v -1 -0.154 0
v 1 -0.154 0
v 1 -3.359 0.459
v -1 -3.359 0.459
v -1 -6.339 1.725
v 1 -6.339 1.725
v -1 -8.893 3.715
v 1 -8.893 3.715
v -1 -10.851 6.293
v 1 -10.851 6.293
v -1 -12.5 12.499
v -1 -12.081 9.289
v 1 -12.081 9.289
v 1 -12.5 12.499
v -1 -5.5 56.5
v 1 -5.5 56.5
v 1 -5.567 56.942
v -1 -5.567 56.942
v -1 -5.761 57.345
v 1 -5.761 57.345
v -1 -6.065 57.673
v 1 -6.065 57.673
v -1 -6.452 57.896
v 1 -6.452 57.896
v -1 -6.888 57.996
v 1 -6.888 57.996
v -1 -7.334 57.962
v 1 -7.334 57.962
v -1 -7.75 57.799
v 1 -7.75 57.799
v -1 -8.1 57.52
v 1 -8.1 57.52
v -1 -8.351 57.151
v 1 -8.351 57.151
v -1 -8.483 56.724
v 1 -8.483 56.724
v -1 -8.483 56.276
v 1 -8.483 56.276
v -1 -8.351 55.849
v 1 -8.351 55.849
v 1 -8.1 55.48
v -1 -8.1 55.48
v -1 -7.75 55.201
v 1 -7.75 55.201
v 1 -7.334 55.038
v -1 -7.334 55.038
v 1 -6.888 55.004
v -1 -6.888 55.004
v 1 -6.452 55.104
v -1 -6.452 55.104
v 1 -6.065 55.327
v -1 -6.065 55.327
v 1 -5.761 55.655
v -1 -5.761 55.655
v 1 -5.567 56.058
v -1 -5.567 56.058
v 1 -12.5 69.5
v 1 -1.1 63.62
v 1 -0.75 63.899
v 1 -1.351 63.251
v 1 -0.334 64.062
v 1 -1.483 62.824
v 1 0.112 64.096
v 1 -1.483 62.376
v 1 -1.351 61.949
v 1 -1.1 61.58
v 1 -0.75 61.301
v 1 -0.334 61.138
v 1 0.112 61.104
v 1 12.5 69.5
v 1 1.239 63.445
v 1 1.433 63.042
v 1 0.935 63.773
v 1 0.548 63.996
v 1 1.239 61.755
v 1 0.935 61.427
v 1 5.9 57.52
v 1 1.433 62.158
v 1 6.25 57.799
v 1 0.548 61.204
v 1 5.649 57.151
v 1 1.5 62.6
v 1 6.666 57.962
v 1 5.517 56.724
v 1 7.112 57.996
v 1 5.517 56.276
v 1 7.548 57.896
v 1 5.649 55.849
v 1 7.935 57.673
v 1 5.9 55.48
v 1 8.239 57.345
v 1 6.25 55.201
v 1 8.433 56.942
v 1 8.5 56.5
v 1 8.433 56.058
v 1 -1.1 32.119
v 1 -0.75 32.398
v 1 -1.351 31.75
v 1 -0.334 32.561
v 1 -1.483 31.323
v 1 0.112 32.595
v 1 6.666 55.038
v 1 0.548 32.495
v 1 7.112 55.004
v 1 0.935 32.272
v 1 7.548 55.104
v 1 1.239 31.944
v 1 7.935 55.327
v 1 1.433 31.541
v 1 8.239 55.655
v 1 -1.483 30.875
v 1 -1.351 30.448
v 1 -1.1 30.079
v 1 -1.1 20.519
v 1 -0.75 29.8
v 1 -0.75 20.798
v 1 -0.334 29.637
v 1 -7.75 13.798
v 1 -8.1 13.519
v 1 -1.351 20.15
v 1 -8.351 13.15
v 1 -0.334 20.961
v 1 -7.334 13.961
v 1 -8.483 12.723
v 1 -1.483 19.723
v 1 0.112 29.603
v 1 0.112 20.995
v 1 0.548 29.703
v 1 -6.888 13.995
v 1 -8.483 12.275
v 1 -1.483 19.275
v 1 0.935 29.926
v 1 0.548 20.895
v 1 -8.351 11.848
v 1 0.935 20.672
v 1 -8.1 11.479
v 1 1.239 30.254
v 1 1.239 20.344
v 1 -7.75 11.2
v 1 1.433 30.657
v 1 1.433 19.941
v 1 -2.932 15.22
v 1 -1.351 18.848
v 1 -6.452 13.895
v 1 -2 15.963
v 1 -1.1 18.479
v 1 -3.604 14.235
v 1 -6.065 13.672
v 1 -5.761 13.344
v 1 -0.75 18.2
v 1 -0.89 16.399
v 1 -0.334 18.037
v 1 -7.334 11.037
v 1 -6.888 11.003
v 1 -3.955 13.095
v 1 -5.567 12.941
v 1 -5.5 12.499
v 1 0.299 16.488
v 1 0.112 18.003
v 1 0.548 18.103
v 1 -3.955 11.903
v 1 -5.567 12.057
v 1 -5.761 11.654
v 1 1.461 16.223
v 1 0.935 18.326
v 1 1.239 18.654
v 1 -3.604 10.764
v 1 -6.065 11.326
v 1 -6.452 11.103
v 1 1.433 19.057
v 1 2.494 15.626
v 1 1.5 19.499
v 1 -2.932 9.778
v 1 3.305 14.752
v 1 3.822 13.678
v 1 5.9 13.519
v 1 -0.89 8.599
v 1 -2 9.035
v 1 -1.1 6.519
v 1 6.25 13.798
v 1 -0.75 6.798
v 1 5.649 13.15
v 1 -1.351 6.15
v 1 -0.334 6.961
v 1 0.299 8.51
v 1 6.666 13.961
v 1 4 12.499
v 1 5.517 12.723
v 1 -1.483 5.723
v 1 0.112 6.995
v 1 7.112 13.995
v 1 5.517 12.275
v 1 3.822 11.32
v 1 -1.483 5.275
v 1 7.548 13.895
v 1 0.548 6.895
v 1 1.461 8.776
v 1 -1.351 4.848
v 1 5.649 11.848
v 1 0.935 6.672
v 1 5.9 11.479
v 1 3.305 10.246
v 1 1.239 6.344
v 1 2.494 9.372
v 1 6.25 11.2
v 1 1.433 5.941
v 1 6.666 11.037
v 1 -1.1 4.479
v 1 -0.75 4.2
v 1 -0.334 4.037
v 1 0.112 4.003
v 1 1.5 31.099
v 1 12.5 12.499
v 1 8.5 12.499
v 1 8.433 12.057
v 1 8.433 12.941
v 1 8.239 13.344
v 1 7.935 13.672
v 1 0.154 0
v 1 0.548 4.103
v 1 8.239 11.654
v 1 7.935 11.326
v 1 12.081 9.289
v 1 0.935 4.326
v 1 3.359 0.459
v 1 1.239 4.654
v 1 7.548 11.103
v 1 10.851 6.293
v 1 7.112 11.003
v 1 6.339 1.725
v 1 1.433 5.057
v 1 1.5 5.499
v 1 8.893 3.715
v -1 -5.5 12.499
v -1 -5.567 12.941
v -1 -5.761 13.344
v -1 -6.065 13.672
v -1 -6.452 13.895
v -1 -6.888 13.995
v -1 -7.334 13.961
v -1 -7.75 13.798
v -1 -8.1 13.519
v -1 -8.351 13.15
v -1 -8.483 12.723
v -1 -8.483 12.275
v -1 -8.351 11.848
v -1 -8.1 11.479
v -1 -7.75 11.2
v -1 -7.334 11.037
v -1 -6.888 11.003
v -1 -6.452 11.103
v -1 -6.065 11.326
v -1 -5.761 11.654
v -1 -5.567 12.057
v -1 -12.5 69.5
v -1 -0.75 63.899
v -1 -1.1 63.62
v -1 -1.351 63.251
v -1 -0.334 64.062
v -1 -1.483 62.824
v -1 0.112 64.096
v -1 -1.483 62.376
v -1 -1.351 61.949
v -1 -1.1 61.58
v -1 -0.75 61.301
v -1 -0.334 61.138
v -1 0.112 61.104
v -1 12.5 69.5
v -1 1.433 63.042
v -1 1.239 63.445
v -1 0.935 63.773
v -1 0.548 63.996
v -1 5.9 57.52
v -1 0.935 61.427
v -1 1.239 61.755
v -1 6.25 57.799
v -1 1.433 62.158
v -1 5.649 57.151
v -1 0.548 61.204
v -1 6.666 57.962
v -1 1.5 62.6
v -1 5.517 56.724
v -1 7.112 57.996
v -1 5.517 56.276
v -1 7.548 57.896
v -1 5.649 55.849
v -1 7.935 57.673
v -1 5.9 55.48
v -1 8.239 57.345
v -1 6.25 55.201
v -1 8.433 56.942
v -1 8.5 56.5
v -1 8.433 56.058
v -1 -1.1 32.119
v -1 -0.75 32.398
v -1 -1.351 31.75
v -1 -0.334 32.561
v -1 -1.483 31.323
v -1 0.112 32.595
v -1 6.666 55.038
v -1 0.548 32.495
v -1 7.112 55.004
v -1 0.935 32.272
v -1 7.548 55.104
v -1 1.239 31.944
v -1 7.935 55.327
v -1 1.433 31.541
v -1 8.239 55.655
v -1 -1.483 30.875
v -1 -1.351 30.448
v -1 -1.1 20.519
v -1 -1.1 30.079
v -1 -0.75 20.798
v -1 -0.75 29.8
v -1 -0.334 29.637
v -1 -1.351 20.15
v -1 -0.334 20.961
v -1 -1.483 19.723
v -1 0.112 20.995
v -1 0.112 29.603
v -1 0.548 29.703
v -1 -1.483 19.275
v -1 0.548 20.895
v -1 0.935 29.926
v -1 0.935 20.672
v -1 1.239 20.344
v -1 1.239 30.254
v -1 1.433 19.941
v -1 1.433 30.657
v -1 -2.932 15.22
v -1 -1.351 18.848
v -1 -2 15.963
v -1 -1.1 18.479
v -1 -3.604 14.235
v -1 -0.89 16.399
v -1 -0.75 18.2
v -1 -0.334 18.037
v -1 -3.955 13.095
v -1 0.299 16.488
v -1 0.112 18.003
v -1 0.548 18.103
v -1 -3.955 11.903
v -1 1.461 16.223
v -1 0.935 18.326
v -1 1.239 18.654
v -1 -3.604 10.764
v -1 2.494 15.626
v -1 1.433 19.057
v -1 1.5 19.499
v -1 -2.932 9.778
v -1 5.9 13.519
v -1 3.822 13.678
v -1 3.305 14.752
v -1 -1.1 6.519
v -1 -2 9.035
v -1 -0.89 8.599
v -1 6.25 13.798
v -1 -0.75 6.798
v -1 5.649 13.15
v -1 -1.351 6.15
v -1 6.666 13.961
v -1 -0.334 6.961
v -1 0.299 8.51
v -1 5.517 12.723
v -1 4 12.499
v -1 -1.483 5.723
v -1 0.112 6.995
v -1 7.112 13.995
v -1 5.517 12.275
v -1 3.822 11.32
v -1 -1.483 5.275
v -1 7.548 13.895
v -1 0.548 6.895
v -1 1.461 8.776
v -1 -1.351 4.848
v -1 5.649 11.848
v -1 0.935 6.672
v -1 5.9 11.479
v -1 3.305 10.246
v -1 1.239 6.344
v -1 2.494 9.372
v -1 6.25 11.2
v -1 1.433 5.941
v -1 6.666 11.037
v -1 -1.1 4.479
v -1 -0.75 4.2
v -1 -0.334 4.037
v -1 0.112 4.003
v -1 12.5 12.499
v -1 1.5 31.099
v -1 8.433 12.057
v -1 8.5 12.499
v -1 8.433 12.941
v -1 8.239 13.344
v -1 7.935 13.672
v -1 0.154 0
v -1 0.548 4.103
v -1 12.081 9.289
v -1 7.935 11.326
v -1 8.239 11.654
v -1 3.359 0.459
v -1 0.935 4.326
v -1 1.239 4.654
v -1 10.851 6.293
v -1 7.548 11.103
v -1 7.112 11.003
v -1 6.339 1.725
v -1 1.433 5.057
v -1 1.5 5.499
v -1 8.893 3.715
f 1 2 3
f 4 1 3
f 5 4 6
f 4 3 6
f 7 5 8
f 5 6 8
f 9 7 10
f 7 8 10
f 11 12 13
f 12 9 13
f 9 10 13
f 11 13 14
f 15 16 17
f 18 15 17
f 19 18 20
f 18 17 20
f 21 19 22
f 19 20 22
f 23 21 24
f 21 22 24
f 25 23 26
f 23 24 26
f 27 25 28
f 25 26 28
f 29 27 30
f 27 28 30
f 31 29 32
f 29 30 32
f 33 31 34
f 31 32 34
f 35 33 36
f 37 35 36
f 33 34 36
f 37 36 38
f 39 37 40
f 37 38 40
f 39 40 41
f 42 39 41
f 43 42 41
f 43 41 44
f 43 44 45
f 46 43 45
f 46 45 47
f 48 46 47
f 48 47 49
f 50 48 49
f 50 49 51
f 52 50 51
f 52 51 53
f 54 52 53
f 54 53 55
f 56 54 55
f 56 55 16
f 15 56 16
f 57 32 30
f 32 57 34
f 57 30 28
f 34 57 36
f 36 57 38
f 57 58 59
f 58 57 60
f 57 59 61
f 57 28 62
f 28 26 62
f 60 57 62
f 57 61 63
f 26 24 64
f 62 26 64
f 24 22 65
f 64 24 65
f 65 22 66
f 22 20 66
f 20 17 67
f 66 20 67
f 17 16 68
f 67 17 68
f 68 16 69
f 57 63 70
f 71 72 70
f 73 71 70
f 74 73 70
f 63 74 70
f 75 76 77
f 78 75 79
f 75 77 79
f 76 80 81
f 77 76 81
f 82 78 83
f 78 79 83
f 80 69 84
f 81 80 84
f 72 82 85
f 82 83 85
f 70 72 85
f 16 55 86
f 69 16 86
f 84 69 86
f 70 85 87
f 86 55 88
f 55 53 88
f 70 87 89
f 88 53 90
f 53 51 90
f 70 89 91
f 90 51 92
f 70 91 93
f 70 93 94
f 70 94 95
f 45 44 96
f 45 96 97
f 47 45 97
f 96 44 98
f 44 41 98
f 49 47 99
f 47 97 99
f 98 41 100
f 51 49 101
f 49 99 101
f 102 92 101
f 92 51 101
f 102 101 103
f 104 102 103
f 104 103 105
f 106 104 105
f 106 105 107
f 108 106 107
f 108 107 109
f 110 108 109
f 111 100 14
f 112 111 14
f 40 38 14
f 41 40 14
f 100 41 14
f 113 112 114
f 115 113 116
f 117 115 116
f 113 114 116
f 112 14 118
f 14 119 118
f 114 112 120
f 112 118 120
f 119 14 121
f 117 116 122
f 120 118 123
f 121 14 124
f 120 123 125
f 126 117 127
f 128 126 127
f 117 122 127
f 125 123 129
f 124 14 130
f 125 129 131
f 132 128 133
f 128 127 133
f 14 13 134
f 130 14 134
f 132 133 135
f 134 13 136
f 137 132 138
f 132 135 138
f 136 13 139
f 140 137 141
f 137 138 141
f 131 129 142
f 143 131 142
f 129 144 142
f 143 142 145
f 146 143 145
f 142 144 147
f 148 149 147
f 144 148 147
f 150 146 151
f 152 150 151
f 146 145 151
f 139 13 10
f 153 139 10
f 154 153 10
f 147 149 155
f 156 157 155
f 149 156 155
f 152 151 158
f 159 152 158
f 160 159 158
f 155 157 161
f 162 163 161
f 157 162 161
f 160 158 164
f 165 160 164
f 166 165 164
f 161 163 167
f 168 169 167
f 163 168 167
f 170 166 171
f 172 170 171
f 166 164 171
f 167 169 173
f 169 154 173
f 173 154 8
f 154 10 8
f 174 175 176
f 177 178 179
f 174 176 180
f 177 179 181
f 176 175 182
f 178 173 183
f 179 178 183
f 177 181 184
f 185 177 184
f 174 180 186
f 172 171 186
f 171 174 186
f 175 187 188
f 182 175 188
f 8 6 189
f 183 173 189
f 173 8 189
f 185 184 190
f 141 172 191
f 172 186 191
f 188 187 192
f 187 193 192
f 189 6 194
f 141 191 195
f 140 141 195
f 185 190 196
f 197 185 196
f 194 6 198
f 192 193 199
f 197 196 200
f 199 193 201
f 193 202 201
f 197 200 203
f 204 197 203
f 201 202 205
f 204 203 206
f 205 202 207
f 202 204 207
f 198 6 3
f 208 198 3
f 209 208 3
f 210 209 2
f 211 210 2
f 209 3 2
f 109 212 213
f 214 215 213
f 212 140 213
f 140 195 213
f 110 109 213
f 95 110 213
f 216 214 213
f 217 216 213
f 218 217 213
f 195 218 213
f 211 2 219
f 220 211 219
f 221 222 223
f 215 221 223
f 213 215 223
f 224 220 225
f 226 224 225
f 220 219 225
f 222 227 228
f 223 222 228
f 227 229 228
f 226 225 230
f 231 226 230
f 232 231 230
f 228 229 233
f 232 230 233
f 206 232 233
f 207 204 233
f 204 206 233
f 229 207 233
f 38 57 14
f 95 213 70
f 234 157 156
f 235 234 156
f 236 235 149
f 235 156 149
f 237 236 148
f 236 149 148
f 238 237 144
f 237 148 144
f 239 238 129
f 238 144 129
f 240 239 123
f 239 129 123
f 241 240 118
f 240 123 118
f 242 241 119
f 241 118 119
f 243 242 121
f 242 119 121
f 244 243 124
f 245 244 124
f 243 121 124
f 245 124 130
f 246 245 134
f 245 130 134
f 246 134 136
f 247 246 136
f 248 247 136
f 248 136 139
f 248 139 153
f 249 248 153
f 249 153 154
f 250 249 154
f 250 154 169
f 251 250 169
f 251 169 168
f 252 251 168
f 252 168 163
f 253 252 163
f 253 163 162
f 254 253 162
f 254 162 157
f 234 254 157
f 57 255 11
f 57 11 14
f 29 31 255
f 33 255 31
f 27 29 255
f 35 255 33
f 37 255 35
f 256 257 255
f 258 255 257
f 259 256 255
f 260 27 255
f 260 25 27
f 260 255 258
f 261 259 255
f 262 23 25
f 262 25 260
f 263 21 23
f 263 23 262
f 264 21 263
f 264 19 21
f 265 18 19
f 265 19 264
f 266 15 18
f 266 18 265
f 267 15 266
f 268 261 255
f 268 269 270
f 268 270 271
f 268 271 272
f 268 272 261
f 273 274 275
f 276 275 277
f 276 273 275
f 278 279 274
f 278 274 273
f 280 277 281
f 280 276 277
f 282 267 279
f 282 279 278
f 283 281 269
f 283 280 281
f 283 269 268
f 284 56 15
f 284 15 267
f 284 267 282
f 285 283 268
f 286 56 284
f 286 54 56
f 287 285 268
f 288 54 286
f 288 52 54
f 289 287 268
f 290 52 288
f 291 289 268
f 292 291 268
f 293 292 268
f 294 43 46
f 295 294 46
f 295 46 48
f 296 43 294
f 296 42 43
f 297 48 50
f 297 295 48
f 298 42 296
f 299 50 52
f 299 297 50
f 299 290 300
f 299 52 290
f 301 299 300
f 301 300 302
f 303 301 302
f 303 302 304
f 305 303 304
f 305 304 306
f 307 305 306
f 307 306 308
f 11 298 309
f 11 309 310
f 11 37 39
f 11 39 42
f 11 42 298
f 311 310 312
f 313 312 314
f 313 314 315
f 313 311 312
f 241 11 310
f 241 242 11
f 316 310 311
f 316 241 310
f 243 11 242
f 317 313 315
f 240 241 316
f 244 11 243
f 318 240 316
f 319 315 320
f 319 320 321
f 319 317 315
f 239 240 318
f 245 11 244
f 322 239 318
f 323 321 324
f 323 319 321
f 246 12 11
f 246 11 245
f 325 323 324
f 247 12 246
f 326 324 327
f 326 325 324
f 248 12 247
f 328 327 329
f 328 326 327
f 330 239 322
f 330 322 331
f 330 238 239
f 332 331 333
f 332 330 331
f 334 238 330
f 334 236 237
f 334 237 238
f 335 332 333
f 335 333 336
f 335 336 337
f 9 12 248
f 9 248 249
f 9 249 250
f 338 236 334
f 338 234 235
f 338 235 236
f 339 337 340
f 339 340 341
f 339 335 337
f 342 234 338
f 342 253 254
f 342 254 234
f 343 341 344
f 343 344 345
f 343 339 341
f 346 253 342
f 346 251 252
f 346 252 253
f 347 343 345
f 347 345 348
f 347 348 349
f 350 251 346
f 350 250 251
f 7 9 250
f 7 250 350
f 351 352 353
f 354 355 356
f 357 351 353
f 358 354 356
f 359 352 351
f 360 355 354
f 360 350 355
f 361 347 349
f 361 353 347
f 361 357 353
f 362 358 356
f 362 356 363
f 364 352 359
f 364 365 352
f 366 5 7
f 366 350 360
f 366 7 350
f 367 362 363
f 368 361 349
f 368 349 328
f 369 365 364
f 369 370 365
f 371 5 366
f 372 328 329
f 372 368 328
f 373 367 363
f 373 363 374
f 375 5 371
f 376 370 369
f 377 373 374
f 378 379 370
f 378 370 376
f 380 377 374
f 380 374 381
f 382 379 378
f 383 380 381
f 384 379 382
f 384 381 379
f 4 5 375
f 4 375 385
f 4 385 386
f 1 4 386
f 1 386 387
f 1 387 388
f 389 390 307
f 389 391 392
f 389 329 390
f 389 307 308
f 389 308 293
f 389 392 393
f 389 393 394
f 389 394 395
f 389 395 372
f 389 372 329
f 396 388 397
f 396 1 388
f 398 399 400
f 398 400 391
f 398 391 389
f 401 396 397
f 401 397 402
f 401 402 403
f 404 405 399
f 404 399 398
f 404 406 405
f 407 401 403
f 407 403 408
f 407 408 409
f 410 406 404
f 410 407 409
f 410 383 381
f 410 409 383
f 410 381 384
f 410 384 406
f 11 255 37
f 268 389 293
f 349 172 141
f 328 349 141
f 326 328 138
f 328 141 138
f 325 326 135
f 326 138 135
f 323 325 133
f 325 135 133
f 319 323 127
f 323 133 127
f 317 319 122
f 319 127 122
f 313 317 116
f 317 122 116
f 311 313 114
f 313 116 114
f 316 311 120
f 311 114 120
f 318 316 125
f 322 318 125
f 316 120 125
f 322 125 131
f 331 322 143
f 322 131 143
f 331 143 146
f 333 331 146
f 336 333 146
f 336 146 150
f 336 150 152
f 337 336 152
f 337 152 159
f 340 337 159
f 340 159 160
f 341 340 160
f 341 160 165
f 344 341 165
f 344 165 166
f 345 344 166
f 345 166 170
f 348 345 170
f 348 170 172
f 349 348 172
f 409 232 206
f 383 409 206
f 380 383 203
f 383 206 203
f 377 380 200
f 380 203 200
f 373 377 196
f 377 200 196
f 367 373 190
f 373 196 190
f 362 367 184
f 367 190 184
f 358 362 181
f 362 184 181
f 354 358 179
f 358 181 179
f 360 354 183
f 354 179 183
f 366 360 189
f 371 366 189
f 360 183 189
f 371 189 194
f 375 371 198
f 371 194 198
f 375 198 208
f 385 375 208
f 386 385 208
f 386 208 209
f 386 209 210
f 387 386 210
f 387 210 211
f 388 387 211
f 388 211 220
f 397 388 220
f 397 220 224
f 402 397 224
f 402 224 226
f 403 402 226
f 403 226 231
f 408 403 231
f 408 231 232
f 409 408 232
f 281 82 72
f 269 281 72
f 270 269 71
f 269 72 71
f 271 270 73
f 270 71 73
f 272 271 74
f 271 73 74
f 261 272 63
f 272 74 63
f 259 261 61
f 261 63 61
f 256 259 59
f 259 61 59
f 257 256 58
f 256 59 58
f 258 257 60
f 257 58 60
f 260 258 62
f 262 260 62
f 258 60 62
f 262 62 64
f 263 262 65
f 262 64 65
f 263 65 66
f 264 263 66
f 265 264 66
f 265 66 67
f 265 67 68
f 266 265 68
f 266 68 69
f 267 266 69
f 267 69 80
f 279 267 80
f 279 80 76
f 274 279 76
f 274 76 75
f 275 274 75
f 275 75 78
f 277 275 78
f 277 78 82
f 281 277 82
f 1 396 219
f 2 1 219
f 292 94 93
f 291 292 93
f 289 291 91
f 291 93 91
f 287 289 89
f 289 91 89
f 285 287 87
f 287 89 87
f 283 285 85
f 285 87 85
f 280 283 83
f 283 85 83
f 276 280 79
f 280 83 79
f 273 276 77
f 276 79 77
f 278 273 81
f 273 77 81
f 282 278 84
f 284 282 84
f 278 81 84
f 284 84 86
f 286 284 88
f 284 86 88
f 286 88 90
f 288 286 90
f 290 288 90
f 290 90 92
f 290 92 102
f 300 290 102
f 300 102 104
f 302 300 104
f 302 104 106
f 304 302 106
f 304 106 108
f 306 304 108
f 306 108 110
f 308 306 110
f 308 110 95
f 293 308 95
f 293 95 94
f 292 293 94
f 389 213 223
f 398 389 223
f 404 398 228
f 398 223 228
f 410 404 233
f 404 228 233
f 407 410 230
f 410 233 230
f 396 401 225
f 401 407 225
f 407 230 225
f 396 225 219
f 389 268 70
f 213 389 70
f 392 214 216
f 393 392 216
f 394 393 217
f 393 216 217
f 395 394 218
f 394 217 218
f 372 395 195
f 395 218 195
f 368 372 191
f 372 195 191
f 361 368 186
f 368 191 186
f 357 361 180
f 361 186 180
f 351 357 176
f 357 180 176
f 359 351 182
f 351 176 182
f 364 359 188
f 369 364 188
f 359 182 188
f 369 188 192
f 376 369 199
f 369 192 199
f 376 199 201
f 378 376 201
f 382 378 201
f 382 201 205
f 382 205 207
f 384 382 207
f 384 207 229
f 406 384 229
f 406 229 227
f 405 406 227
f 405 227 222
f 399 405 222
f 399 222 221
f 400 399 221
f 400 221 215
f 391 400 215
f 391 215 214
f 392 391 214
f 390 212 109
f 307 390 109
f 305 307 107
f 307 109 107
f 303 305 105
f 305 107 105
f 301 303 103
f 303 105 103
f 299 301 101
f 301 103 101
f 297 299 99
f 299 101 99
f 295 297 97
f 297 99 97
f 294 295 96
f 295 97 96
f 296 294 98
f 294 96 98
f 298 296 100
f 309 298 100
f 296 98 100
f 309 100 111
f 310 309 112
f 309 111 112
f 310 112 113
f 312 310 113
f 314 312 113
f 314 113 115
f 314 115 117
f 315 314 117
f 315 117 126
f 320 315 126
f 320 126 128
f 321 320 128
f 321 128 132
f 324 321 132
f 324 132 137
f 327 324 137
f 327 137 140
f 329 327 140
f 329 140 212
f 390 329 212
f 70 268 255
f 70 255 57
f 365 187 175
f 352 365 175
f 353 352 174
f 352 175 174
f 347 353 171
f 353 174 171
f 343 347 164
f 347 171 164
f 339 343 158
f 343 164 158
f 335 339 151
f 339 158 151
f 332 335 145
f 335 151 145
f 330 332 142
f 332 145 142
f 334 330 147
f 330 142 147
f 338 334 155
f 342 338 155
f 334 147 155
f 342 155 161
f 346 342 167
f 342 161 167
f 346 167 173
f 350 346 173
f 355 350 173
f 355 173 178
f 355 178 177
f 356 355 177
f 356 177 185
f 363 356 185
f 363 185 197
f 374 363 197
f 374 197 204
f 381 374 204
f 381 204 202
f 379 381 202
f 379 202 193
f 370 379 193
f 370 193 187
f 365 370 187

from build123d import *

# Parameters (mm, degrees)
SKETCH_1_W          = 2
SKETCH_1_H          = 25
EXTRUDE_1_DEPTH     = 69.5
SKETCH_2_R          = 1.5
SKETCH_2_R_2        = 4
CUT_EXTRUDE_2_DEPTH = 69.5
SKETCH_4_R          = 1.5
CUT_EXTRUDE_3_DEPTH = 10


with BuildPart() as part:
    # 草图1 → 凸台-拉伸1 (new body)
    with BuildSketch(Plane.XY):
        Rectangle(SKETCH_1_W, SKETCH_1_H)
    extrude(amount=EXTRUDE_1_DEPTH)

    # 草图2 → 切除-拉伸2 (cut)
    with BuildSketch(Plane(origin=(1, 0, 0), x_dir=(0, 0, -1), z_dir=(1, 0, 0))):
        with BuildLine():
            Line((0, 12.5), (-12.499054261, 12.5))
            ThreePointArc((-12.499054261, 12.5), (-3.714750597, 8.893031494), (0, 0.153761464))
            Line((0, 0.153761464), (0, 12.5))
        make_face()
        with BuildLine():
            Line((0, -12.5), (0, -0.153761464))
            ThreePointArc((0, -0.153761464), (-3.714750597, -8.893031494), (-12.499054261, -12.5))
            Line((-12.499054261, -12.5), (0, -12.5))
        make_face()
        with Locations(Location((-5.499054261, 0, 0), (0, 0, 90))):
            Circle(SKETCH_2_R)
        with Locations(Location((-12.499054261, 7, 0), (0, 0, 90))):
            Circle(SKETCH_2_R)
        with Locations(Location((-12.499054261, -7, 0), (0, 0, 90))):
            Circle(SKETCH_2_R)
        with Locations(Location((-19.499054261, 0, 0), (0, 0, 90))):
            Circle(SKETCH_2_R)
        with Locations(Location((-12.499054261, 0, 0), (0, 0, 90))):
            Circle(SKETCH_2_R_2)
        with Locations(Location((-31.099054261, 0, 0), (0, 0, 90))):
            Circle(SKETCH_2_R)
    extrude(amount=-CUT_EXTRUDE_2_DEPTH, mode=Mode.SUBTRACT)

    # 草图4 → 切除-拉伸3 (cut)
    with BuildSketch(Plane(origin=(1, 0, 0), x_dir=(0, 0, -1), z_dir=(1, 0, 0))):
        with Locations(Location((-62.6, 0, 0), (0, 0, 90))):
            Circle(SKETCH_4_R)
        with Locations(Location((-56.5, 7, 0), (0, 0, 90))):
            Circle(SKETCH_4_R)
        with Locations(Location((-56.5, -7, 0), (0, 0, 90))):
            Circle(SKETCH_4_R)
    extrude(amount=-CUT_EXTRUDE_3_DEPTH, mode=Mode.SUBTRACT)


solid = part.part
